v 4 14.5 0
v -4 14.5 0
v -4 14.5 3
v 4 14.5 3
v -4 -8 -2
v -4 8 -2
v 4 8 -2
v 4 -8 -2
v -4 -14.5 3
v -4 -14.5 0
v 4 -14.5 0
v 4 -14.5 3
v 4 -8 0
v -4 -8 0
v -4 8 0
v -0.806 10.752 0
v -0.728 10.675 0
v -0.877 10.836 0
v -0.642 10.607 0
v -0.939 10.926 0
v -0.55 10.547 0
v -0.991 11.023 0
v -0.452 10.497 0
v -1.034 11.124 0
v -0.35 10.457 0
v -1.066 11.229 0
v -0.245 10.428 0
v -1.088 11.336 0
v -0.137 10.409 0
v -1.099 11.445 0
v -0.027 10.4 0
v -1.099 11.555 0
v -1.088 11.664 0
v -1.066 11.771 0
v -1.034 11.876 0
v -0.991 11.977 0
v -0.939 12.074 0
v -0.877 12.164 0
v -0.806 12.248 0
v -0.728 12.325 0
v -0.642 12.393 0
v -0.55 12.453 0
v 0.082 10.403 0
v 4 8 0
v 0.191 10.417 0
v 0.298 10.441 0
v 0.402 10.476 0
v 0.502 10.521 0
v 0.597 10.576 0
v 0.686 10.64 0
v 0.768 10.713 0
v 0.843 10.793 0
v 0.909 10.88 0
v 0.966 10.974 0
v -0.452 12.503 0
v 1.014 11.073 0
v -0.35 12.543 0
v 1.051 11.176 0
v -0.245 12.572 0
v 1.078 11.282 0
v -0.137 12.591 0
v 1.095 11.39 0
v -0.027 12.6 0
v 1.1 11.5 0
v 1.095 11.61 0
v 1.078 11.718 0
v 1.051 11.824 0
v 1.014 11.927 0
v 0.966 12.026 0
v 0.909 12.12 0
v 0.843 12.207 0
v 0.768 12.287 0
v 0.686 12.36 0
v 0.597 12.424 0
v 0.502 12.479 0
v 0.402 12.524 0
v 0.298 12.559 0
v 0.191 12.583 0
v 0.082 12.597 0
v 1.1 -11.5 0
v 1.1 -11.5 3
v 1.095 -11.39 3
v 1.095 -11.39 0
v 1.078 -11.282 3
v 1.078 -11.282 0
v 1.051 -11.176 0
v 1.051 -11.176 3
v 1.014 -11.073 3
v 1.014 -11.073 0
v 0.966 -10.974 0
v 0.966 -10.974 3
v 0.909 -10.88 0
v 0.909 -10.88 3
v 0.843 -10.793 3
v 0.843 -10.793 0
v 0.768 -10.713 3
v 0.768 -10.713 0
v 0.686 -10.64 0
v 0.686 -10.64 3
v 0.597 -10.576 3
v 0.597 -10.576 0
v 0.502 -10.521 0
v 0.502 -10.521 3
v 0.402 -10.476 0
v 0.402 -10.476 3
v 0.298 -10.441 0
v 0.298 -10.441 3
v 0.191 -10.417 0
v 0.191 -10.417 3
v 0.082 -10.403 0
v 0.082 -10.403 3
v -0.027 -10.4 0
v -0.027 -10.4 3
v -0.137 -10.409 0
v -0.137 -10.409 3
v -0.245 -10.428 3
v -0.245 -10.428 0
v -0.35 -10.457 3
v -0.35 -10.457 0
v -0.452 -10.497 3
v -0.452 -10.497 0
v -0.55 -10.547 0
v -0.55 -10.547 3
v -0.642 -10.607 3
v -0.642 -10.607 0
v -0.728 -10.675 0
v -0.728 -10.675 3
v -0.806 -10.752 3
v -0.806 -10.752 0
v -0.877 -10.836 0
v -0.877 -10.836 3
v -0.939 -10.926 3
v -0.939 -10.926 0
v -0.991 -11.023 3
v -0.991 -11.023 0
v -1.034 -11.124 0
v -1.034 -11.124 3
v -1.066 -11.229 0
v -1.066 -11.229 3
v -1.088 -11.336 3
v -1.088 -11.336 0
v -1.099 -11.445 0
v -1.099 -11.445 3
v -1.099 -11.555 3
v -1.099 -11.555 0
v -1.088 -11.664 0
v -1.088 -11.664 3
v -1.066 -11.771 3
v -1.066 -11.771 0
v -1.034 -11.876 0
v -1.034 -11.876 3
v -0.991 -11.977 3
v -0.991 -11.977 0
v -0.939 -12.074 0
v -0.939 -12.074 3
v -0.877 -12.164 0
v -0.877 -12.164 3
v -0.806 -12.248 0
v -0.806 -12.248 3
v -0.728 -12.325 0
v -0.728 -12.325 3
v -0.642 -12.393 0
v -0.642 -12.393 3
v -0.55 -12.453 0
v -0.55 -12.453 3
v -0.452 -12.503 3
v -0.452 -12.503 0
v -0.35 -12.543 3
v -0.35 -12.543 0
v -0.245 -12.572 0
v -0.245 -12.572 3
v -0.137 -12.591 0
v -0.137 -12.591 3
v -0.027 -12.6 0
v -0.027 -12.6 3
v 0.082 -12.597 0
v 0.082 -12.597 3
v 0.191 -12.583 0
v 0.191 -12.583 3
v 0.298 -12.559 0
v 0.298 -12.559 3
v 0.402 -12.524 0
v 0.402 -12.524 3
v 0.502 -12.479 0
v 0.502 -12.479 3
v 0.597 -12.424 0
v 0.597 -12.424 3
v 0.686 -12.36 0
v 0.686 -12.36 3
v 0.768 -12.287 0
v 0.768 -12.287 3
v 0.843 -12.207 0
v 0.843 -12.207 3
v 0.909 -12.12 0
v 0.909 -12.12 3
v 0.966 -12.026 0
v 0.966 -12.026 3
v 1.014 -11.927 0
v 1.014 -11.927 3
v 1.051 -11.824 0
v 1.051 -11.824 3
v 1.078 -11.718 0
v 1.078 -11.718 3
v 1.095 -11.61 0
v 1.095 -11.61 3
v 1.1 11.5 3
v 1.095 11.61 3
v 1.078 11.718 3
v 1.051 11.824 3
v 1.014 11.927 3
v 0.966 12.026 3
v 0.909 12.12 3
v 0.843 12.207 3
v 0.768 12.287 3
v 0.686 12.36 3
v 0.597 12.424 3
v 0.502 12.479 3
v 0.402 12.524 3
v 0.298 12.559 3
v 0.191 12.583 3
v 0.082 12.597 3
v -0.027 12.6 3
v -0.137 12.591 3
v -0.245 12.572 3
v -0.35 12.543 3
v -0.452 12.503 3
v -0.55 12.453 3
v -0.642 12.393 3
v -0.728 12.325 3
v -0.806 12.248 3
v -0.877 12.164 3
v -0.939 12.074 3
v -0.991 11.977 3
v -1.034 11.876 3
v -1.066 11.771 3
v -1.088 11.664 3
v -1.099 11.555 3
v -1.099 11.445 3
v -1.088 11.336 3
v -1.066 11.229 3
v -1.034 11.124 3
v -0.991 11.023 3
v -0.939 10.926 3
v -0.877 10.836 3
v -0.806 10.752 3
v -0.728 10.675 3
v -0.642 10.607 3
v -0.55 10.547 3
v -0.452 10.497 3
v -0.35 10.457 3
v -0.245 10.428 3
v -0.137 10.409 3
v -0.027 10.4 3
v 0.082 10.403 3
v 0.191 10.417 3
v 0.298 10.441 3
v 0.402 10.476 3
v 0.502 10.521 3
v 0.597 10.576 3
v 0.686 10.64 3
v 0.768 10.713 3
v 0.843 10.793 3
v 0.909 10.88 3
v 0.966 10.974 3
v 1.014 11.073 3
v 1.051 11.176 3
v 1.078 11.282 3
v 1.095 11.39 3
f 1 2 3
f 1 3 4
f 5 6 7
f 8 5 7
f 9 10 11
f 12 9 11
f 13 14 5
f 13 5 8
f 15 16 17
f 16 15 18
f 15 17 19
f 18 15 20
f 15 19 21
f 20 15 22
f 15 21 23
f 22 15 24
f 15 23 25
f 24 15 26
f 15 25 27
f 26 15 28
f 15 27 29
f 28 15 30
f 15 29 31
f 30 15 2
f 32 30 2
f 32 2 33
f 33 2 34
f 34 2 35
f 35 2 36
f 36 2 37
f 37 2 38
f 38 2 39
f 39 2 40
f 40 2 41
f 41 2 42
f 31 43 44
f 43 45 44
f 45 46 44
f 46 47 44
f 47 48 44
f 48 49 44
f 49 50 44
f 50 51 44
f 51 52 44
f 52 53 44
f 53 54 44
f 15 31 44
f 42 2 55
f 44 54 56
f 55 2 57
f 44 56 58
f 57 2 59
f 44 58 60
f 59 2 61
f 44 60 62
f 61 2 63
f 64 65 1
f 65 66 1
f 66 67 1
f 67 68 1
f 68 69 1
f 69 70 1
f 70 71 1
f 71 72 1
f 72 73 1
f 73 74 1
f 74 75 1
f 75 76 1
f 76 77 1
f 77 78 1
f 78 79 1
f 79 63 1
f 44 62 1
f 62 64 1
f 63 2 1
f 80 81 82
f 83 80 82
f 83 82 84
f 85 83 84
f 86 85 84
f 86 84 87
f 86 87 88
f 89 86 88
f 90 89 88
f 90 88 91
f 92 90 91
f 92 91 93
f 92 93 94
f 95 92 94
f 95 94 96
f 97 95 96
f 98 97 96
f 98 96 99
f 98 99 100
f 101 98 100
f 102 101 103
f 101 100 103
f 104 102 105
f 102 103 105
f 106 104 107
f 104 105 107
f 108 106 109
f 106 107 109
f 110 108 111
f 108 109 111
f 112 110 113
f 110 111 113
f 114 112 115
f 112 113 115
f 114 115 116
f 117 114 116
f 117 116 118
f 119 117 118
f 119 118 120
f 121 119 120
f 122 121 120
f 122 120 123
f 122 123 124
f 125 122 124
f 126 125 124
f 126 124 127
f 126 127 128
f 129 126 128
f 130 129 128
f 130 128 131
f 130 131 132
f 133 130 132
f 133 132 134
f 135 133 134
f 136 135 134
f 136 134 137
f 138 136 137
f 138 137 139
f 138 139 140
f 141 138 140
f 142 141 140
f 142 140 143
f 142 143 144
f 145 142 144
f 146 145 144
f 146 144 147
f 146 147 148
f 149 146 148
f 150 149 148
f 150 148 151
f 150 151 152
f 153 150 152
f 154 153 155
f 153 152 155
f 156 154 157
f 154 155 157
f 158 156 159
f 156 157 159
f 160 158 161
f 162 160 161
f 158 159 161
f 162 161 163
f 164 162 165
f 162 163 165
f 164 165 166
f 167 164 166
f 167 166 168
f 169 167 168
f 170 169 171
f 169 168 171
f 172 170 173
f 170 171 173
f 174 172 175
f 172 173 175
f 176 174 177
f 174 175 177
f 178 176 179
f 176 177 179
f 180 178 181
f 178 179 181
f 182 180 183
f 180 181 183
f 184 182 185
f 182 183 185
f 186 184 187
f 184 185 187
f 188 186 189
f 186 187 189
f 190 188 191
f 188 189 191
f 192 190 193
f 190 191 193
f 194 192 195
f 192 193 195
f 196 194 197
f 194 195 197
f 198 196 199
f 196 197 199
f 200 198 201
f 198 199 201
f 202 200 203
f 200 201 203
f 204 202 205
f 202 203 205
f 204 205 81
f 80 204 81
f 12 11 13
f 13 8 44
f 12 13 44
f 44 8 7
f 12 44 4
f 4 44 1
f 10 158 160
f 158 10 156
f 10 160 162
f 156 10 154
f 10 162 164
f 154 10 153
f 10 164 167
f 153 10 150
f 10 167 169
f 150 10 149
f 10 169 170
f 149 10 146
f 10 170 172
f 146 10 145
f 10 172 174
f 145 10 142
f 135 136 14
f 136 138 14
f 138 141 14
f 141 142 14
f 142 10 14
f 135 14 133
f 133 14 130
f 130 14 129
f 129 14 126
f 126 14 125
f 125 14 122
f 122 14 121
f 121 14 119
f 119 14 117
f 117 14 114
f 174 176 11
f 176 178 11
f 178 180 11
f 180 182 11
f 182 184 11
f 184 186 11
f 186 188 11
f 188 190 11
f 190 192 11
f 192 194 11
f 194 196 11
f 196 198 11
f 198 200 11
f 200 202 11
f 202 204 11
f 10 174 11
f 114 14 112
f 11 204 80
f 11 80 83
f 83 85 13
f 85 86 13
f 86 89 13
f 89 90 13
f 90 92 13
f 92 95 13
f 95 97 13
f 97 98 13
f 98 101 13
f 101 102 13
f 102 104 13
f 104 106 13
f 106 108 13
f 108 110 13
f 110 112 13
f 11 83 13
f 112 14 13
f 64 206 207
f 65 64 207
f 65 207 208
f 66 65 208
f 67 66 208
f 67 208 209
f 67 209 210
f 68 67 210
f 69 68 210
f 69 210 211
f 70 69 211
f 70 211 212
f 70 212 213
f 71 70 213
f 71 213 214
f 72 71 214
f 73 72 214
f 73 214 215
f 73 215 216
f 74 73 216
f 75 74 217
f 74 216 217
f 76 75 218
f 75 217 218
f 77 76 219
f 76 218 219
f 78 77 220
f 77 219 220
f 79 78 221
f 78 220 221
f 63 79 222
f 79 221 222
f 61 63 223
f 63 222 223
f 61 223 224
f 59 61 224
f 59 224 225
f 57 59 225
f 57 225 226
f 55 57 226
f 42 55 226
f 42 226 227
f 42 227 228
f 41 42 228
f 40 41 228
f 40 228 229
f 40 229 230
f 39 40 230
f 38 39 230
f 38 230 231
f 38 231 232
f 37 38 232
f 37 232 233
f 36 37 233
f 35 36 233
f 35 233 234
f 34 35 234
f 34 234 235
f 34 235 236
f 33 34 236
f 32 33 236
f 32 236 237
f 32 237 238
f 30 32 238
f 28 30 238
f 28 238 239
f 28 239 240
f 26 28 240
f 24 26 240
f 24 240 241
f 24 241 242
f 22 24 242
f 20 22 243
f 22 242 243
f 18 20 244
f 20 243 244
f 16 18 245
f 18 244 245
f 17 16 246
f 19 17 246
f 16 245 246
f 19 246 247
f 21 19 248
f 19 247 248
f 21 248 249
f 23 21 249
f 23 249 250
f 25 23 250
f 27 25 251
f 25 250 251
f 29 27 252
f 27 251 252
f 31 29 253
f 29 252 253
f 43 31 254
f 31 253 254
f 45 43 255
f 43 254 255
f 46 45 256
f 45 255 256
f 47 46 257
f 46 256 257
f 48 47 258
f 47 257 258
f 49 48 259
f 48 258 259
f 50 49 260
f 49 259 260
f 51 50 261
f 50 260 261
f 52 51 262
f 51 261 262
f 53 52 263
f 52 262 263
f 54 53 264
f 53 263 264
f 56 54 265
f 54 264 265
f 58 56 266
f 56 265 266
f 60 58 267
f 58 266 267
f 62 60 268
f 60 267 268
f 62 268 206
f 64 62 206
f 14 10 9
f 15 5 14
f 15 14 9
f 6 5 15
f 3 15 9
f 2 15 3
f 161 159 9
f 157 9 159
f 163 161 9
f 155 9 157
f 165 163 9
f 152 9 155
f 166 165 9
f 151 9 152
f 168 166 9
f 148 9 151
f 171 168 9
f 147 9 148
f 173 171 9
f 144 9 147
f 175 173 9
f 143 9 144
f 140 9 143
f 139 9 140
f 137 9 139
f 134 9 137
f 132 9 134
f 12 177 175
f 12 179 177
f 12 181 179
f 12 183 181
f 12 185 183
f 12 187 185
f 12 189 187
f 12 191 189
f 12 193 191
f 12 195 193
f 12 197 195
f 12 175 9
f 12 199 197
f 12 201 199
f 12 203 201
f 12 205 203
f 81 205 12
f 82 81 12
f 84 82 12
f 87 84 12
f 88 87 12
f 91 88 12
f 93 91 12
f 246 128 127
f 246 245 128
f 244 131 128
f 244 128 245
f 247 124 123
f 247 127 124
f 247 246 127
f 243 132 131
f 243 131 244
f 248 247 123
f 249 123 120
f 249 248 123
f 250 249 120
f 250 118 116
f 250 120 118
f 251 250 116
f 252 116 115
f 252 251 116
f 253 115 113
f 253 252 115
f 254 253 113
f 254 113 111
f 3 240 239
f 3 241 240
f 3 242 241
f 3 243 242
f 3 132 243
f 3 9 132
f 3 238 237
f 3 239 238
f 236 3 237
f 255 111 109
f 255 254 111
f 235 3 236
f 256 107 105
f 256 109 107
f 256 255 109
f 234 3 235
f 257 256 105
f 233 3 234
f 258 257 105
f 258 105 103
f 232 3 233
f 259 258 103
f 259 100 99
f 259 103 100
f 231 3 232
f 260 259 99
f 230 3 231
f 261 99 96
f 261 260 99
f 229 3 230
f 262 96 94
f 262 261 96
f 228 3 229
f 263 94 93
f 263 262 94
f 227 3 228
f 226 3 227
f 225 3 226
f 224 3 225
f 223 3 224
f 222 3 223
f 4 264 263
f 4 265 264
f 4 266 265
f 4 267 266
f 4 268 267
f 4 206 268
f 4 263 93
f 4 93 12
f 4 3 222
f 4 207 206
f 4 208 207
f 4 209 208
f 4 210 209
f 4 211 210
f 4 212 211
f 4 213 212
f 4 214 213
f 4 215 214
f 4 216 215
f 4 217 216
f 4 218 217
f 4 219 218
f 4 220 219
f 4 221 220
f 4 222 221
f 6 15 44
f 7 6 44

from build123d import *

# Parameters (mm, degrees)
SKETCH_1_W            = 8
SKETCH_1_H            = 29
EXTRUDE_241_DEPTH     = 3
SKETCH_2_W            = 8
SKETCH_2_H            = 16
EXTRUDE_361_DEPTH     = 2
CUT_EXTRUDE_555_REACH = 17.851
SKETCH_3_R            = 1.1


with BuildPart() as part:
    # 草图1 → Extrude 241 (new body)
    with BuildSketch(Plane.XY):
        Rectangle(SKETCH_1_W, SKETCH_1_H)
    extrude(amount=EXTRUDE_241_DEPTH)

    # 草图2 → Extrude 361 (add)
    with BuildSketch(Plane.XY):
        Rectangle(SKETCH_2_W, SKETCH_2_H)
    extrude(amount=-EXTRUDE_361_DEPTH)

    # 草图3 → Cut-Extrude 555 (cut, up to next)
    with BuildSketch(Plane.XY.offset(3), mode=Mode.PRIVATE) as cut_extrude_555_sk1:
        with Locations((0, 11.5)):
            Circle(SKETCH_3_R)
    cut_extrude_555_tool1 = extrude(cut_extrude_555_sk1.sketch, amount=-CUT_EXTRUDE_555_REACH, mode=Mode.PRIVATE) & part.part
    # 草图3 → Cut-Extrude 555 (cut, up to next)
    with BuildSketch(Plane.XY.offset(3), mode=Mode.PRIVATE) as cut_extrude_555_sk2:
        with Locations((0, -11.5)):
            Circle(SKETCH_3_R)
    cut_extrude_555_tool2 = extrude(cut_extrude_555_sk2.sketch, amount=-CUT_EXTRUDE_555_REACH, mode=Mode.PRIVATE) & part.part
    add(cut_extrude_555_tool1.solids().sort_by_distance((0, 11.5, 3))[0], mode=Mode.SUBTRACT)
    add(cut_extrude_555_tool2.solids().sort_by_distance((0, -11.5, 3))[0], mode=Mode.SUBTRACT)


solid = part.part
